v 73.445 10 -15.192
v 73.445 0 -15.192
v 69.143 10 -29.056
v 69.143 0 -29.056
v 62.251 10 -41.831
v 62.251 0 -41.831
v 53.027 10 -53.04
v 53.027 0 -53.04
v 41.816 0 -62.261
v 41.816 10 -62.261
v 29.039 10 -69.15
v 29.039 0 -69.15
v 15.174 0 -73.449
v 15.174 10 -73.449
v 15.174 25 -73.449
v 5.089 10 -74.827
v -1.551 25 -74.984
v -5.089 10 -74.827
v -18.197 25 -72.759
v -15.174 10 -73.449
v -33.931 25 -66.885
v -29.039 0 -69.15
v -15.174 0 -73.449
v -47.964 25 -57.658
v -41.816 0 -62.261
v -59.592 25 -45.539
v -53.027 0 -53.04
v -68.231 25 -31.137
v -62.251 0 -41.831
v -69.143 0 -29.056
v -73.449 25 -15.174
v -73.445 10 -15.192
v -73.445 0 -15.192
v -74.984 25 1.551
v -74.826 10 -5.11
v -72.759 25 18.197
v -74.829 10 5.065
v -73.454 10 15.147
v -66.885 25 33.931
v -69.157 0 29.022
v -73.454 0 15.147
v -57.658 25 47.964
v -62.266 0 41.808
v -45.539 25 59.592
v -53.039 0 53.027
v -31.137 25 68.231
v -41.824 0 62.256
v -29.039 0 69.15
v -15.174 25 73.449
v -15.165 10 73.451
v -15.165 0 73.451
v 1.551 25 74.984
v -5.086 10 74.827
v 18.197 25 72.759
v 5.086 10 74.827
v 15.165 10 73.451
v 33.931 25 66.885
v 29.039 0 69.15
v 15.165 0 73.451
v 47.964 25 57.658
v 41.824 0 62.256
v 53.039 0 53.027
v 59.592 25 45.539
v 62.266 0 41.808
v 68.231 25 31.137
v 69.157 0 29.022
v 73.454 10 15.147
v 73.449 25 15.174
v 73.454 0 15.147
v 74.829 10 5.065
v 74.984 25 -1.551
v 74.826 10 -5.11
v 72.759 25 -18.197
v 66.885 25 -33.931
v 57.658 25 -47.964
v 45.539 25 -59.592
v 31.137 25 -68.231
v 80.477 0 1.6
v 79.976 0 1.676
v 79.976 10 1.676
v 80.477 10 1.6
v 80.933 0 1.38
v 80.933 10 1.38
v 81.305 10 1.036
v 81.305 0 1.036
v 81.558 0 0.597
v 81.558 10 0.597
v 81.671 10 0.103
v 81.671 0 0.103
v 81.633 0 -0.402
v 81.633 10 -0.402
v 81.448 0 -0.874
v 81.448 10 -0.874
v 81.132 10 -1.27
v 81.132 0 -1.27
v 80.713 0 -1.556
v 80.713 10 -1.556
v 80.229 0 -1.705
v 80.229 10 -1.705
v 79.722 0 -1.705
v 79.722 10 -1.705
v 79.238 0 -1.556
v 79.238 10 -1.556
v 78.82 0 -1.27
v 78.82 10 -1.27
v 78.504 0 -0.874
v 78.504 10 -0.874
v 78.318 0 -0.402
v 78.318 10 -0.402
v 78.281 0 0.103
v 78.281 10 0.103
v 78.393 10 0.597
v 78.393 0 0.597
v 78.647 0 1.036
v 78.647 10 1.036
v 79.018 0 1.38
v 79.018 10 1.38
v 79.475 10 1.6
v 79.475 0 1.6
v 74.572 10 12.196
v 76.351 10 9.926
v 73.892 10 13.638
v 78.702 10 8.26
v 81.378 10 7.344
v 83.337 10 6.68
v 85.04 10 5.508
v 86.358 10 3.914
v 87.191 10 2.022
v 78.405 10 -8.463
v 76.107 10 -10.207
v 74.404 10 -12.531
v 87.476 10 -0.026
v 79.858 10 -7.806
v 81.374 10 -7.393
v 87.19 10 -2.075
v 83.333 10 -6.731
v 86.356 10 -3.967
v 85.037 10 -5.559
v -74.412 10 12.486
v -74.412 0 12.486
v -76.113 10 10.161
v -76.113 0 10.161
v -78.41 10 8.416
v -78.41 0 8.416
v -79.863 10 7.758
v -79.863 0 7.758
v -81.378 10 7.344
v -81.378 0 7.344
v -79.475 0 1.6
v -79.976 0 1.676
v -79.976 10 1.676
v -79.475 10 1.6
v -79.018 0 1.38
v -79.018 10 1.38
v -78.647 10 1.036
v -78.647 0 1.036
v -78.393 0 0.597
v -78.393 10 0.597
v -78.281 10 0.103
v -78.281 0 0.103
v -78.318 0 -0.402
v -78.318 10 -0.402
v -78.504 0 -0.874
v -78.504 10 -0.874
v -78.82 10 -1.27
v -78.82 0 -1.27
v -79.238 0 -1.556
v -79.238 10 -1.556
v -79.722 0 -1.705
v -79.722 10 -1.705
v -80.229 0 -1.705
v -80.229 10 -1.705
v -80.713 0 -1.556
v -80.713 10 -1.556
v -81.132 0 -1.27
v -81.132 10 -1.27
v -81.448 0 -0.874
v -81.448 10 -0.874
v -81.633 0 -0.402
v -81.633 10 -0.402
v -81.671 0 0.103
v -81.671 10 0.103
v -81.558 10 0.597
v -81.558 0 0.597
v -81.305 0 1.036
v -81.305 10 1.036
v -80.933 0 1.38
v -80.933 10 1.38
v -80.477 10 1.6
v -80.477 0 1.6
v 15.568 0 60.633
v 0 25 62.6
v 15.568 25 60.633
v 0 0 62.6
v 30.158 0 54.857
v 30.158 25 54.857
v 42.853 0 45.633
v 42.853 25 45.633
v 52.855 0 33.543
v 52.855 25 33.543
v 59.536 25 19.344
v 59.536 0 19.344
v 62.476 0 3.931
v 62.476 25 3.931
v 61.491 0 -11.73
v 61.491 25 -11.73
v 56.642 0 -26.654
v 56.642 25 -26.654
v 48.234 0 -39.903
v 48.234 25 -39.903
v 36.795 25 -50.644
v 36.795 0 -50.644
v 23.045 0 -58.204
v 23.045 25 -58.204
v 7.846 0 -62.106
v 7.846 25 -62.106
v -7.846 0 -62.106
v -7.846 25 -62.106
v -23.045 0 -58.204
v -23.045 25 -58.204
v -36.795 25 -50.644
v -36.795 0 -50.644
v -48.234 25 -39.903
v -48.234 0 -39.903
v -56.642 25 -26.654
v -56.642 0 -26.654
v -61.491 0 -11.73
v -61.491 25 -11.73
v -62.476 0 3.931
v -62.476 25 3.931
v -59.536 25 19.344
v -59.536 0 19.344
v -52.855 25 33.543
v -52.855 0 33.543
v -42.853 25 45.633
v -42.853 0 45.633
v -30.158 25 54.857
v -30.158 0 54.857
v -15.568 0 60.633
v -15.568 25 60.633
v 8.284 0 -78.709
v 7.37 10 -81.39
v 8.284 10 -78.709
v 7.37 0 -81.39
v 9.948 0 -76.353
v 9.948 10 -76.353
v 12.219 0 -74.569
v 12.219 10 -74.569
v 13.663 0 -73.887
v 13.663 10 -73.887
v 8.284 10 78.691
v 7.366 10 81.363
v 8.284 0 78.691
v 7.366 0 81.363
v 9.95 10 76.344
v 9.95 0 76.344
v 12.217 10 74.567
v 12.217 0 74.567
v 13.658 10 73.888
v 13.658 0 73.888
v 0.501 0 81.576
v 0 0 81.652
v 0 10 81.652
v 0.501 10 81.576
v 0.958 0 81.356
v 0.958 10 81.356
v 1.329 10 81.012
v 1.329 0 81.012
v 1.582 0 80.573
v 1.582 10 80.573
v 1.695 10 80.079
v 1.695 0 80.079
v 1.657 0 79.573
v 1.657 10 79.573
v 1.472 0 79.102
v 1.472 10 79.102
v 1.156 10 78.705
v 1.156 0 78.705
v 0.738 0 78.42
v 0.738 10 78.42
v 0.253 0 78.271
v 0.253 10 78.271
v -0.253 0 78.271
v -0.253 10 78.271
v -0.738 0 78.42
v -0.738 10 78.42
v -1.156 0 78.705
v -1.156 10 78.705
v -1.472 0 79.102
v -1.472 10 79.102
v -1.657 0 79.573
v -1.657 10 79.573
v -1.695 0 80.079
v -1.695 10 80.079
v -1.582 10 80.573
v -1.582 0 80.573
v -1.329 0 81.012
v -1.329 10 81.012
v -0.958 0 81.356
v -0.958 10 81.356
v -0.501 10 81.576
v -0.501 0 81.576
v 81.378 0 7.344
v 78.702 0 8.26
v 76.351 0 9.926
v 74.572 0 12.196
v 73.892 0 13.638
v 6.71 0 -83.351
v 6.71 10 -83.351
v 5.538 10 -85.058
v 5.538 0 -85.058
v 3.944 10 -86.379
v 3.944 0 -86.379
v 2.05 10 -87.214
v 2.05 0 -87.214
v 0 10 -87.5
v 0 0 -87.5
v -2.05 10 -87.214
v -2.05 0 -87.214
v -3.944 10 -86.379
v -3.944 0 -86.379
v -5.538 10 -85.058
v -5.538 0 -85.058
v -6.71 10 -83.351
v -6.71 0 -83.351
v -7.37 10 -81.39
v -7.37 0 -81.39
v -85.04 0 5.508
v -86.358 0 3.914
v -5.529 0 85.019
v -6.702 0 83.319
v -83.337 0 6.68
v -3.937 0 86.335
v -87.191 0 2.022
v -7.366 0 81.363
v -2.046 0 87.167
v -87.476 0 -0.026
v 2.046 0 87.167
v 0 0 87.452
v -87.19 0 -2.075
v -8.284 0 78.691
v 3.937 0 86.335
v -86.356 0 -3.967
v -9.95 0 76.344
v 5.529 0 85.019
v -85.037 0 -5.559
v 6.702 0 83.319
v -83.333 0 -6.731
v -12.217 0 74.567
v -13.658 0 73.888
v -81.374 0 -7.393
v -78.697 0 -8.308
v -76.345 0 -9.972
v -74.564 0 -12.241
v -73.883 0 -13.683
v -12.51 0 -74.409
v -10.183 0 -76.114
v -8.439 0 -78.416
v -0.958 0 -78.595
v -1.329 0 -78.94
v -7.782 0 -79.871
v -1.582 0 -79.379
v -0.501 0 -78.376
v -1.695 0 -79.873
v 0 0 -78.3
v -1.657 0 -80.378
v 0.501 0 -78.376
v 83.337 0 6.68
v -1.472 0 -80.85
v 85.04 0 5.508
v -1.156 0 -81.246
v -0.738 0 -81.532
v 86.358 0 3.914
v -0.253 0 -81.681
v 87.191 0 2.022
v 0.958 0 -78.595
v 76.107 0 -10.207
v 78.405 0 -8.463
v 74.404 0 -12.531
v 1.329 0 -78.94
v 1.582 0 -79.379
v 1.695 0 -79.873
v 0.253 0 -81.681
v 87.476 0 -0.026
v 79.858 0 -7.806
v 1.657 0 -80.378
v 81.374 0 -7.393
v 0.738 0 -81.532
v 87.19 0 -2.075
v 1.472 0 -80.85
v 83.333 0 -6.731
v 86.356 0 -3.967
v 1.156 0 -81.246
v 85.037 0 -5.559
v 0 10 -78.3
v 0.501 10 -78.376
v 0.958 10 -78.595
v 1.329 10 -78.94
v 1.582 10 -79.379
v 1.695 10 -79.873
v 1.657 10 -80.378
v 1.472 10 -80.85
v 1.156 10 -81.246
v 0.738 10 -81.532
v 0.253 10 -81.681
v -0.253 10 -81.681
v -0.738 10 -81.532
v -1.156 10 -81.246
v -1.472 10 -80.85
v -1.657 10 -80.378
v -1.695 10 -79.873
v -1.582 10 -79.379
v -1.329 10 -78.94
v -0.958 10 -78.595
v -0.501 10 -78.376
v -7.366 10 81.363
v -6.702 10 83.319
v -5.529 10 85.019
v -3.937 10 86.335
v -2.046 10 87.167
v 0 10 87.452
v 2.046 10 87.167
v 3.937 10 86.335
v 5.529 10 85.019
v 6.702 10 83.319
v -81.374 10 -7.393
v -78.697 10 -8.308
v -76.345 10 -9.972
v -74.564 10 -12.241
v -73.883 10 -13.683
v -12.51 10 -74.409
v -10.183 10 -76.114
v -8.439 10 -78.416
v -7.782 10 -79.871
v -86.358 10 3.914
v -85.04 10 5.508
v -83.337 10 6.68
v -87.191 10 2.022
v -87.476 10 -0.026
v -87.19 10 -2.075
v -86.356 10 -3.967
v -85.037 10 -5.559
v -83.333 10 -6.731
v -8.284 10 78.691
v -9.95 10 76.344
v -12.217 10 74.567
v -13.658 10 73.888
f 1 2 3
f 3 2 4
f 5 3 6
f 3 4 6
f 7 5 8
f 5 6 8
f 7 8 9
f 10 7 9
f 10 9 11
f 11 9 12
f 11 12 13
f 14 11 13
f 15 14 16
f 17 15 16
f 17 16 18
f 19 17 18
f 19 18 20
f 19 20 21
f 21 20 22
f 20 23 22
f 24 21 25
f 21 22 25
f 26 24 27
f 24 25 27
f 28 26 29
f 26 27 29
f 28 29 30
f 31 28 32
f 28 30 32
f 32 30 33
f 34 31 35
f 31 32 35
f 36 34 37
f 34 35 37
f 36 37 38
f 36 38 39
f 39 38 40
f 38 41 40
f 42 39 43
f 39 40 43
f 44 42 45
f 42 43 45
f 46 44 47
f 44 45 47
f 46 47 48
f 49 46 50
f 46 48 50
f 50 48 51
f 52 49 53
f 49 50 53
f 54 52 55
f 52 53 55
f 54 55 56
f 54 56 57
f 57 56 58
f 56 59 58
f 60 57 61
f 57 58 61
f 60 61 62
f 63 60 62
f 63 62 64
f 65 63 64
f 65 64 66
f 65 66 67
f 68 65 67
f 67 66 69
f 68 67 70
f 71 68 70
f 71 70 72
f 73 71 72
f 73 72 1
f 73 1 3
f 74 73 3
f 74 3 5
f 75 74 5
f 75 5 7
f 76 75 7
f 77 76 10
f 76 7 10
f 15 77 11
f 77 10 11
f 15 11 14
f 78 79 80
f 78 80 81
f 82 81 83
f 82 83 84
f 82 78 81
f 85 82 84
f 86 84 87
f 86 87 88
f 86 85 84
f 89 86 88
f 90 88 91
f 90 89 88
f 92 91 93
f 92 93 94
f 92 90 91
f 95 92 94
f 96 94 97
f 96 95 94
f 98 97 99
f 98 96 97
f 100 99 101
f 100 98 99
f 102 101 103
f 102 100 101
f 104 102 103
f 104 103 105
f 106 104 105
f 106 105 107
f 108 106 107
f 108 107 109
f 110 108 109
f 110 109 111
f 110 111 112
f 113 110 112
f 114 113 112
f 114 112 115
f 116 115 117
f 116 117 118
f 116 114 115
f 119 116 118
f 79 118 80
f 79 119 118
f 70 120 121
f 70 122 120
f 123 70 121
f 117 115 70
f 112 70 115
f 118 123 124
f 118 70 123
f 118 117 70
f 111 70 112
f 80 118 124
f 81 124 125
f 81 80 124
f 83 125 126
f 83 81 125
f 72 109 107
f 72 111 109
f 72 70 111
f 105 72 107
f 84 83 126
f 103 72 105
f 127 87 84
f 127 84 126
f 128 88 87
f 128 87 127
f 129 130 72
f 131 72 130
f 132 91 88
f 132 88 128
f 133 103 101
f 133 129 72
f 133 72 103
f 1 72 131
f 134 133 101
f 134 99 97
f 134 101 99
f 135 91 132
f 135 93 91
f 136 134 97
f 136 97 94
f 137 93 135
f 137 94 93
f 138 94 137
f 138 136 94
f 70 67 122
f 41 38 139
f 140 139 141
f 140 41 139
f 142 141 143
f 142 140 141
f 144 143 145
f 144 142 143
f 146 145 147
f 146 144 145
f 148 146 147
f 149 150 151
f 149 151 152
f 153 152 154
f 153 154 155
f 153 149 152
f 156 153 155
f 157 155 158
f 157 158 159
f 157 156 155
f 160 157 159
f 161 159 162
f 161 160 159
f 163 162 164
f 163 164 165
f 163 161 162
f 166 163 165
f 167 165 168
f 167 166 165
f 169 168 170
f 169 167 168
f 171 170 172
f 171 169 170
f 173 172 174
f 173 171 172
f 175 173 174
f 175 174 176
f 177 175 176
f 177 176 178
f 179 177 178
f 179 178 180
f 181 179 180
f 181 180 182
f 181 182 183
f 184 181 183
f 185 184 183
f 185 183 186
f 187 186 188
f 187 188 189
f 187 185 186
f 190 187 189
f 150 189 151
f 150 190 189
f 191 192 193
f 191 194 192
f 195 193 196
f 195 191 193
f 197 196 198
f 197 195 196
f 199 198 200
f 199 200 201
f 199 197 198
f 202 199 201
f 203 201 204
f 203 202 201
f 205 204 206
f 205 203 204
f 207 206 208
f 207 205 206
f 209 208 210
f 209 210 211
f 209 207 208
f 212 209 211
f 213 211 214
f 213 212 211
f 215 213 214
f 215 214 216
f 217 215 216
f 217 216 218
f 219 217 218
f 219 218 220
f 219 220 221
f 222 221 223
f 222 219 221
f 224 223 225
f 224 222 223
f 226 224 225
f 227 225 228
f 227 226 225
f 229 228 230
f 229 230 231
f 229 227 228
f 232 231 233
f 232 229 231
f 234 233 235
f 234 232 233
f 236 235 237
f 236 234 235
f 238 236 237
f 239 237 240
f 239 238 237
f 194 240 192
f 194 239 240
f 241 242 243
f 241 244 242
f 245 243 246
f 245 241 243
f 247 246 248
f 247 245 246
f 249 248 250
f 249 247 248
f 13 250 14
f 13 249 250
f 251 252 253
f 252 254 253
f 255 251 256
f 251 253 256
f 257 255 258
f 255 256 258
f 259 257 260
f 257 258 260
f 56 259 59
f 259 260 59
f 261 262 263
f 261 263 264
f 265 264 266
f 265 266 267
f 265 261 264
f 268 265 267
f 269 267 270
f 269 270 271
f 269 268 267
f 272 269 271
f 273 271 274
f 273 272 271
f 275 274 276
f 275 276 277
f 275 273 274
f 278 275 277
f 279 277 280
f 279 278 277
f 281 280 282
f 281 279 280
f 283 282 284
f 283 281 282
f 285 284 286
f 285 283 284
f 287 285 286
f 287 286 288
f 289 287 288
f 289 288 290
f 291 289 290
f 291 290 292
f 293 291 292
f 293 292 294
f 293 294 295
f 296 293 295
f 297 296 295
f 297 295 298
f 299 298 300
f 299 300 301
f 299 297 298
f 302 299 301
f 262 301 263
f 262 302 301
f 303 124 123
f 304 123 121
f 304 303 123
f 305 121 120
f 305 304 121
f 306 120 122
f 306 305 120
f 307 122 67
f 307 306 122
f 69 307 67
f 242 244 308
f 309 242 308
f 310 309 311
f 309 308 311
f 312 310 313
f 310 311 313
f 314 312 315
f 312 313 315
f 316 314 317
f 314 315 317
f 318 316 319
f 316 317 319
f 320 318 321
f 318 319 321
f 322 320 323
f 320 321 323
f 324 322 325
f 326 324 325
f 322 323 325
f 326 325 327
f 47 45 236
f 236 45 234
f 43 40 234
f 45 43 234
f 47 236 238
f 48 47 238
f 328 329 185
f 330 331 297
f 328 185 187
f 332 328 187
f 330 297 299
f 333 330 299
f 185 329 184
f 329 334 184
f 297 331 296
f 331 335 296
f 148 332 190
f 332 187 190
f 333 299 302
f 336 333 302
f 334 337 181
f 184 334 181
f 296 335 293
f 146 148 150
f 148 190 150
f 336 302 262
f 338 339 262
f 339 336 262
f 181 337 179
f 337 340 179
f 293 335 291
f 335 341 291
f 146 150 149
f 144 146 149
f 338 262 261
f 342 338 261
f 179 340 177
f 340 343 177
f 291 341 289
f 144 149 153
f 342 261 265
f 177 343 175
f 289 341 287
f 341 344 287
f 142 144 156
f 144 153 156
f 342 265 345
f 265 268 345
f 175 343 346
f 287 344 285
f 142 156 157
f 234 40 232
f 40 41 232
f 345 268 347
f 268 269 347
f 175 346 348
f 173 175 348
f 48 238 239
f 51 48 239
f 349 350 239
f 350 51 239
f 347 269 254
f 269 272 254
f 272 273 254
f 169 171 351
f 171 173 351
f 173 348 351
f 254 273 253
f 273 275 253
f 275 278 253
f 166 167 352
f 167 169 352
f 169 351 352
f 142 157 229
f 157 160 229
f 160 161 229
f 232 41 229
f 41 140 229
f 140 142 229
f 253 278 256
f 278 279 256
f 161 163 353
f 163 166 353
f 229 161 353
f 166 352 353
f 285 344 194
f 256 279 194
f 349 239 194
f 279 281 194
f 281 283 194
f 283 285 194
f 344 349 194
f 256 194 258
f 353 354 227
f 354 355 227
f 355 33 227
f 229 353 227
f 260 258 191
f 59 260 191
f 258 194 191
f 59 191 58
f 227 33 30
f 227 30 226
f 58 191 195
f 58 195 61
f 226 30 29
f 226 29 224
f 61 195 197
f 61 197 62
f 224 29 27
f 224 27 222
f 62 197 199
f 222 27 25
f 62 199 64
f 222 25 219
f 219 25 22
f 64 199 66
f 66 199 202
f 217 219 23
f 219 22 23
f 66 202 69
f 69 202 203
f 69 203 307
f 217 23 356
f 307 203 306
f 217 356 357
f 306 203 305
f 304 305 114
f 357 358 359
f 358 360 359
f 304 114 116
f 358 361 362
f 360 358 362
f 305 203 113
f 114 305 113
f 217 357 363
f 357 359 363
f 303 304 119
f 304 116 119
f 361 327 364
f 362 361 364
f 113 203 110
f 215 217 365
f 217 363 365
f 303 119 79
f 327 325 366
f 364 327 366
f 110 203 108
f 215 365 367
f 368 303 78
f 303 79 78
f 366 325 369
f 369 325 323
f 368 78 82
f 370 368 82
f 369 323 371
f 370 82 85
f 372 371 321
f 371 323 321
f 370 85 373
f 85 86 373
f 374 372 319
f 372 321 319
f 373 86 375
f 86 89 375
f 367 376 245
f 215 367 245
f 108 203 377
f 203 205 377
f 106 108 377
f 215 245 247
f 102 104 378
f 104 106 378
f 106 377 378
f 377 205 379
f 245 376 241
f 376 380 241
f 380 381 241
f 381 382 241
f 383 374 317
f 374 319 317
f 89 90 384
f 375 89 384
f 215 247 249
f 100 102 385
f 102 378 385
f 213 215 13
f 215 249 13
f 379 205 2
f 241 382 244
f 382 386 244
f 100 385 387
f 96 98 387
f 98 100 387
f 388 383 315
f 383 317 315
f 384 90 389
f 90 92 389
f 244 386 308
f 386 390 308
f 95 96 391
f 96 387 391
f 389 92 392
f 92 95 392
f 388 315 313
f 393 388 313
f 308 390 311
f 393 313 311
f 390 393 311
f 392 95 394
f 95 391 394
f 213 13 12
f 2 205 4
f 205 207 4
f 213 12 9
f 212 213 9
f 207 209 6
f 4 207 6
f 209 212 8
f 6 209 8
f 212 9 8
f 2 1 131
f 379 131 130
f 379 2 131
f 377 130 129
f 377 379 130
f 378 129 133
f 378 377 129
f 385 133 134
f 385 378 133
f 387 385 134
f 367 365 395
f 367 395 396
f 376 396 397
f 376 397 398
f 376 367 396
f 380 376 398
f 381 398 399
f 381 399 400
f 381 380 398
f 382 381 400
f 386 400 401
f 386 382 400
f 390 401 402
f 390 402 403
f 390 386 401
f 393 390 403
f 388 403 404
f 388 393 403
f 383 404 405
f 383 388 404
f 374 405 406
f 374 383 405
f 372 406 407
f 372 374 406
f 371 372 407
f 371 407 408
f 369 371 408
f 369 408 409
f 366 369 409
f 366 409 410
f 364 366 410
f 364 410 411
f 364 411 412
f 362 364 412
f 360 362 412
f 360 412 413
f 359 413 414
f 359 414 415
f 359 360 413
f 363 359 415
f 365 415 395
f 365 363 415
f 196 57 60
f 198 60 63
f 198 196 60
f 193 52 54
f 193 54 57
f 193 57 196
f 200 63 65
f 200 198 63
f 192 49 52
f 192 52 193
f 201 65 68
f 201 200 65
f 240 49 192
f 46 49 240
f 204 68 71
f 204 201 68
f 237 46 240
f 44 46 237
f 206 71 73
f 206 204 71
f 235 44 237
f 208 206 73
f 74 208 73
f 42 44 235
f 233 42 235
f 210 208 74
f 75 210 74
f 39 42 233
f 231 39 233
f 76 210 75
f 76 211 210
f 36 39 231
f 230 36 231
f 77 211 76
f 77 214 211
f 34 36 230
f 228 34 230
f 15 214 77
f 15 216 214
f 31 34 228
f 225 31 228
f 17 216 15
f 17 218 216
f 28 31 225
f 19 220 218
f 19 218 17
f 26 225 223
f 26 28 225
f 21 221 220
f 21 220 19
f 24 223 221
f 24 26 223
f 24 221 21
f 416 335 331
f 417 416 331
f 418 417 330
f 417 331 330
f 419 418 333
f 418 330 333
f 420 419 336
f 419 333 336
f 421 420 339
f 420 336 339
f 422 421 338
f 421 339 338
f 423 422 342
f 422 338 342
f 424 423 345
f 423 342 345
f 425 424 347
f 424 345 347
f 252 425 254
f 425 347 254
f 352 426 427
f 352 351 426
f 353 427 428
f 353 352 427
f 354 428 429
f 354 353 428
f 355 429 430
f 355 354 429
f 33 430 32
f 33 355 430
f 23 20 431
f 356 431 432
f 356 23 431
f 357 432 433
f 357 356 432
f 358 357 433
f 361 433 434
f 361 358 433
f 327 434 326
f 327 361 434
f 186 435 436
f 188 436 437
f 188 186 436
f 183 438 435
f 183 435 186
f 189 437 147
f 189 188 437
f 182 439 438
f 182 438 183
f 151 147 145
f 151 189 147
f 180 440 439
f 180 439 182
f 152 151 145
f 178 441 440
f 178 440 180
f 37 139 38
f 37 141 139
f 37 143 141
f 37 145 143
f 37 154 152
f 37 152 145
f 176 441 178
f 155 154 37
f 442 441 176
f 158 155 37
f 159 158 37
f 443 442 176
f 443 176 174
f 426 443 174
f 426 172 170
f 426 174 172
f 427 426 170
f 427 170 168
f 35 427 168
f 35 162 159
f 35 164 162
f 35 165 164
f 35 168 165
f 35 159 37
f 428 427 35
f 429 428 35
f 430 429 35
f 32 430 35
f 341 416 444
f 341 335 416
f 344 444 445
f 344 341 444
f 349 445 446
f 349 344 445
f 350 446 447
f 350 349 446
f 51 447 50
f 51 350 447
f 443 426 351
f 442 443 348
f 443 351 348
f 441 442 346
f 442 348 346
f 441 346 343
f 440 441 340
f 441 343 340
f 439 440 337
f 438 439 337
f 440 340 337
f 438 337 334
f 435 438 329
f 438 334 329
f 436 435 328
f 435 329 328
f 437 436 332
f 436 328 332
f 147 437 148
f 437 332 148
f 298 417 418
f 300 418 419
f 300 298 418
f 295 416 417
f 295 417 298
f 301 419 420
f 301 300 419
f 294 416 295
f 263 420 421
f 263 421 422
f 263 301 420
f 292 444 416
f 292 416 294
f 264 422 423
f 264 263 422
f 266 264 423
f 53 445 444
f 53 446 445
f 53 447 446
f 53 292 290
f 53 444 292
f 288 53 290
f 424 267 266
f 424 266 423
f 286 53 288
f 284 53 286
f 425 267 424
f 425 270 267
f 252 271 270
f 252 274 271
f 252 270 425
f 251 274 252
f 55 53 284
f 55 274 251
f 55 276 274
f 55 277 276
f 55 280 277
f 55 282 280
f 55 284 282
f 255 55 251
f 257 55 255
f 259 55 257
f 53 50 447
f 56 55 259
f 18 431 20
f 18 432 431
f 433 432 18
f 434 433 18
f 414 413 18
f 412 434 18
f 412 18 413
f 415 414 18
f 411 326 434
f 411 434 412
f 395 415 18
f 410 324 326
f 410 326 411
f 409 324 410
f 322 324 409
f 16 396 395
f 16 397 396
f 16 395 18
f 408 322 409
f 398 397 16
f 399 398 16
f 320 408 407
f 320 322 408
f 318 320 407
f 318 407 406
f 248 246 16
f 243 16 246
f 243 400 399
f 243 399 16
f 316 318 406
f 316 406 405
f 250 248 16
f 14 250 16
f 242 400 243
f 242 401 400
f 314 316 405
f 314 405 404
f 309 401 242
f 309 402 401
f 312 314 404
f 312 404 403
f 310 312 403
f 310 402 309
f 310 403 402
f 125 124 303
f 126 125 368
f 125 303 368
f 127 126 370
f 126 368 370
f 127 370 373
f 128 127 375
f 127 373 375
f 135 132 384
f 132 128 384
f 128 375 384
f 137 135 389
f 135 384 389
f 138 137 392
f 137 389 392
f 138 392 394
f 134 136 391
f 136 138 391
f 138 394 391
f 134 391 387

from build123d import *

# Parameters (mm, degrees)
SKETCH1_R           = 75
SKETCH1_R_2         = 62.6
SKETCH1_R_3         = 7.5
SKETCH1_R_4         = 1.7
BOSS_EXTRUDE1_DEPTH = 10
FILLET1_R           = 10
SKETCH2_R           = 75
SKETCH2_R_2         = 62.6
BOSS_EXTRUDE2_DEPTH = 15


with BuildPart() as part:
    # Sketch1 → Boss-Extrude1 (new body)
    # profile 1 of 5: a face of its own
    with BuildSketch(Plane(origin=(0, 0, 0), x_dir=(1, 0, 0), z_dir=(0, 1, 0))):
        Circle(SKETCH1_R)
        with Locations(Location((0, 0, 0), (0, 0, 270))):
            Circle(SKETCH1_R_2, mode=Mode.SUBTRACT)
    # profile 2 of 5: a face of its own
    with BuildSketch(Plane(origin=(0, 0, 0), x_dir=(1, 0, 0), z_dir=(0, 1, 0))):
        with Locations((0, 80)):
            Circle(SKETCH1_R_3)
        with Locations(Location((0, 80, 0), (0, 0, 270))):
            Circle(SKETCH1_R_4, mode=Mode.SUBTRACT)
    # profile 3 of 5: a face of its own
    with BuildSketch(Plane(origin=(0, 0, 0), x_dir=(1, 0, 0), z_dir=(0, 1, 0))):
        with Locations((79.975806452, 0.024193548)):
            Circle(SKETCH1_R_3)
        with Locations(Location((79.975806452, 0.024193548, 0), (0, 0, 270))):
            Circle(SKETCH1_R_4, mode=Mode.SUBTRACT)
    # profile 4 of 5: a face of its own
    with BuildSketch(Plane(origin=(0, 0, 0), x_dir=(1, 0, 0), z_dir=(0, 1, 0))):
        with Locations((0, -79.951612903)):
            Circle(SKETCH1_R_3)
        with Locations(Location((0, -79.951612903, 0), (0, 0, 270))):
            Circle(SKETCH1_R_4, mode=Mode.SUBTRACT)
    # profile 5 of 5: a face of its own
    with BuildSketch(Plane(origin=(0, 0, 0), x_dir=(1, 0, 0), z_dir=(0, 1, 0))):
        with Locations((-79.975806452, 0.024193548)):
            Circle(SKETCH1_R_3)
        with Locations(Location((-79.975806452, 0.024193548, 0), (0, 0, 270))):
            Circle(SKETCH1_R_4, mode=Mode.SUBTRACT)
    extrude(amount=BOSS_EXTRUDE1_DEPTH)

    # Fillet1
    fillet1_edges = [part.edges().sort_by_distance(p)[0] for p in [
        (-74.804759202, 5, 5.408142077),
        (-74.801473468, 5, -5.453399584),
        (5.452241155, 5, 74.801557914),
        (-5.452241155, 5, 74.801557914),
        (74.801473468, 5, -5.453399584),
        (74.804759202, 5, 5.408142077),
        (-5.409133759, 5, -74.8046875),
        (5.409133759, 5, -74.8046875),
    ]]
    fillet(fillet1_edges, radius=FILLET1_R)

    # Sketch2 → Boss-Extrude2 (add)
    with BuildSketch(Plane(origin=(0, 10, 0), x_dir=(1, 0, 0), z_dir=(0, 1, 0))):
        with Locations(Location((0, 0, 0), (0, 0, 78.327450214))):
            Circle(SKETCH2_R)
        with Locations(Location((0, 0, 0), (0, 0, 270))):
            Circle(SKETCH2_R_2, mode=Mode.SUBTRACT)
    extrude(amount=BOSS_EXTRUDE2_DEPTH)


solid = part.part
